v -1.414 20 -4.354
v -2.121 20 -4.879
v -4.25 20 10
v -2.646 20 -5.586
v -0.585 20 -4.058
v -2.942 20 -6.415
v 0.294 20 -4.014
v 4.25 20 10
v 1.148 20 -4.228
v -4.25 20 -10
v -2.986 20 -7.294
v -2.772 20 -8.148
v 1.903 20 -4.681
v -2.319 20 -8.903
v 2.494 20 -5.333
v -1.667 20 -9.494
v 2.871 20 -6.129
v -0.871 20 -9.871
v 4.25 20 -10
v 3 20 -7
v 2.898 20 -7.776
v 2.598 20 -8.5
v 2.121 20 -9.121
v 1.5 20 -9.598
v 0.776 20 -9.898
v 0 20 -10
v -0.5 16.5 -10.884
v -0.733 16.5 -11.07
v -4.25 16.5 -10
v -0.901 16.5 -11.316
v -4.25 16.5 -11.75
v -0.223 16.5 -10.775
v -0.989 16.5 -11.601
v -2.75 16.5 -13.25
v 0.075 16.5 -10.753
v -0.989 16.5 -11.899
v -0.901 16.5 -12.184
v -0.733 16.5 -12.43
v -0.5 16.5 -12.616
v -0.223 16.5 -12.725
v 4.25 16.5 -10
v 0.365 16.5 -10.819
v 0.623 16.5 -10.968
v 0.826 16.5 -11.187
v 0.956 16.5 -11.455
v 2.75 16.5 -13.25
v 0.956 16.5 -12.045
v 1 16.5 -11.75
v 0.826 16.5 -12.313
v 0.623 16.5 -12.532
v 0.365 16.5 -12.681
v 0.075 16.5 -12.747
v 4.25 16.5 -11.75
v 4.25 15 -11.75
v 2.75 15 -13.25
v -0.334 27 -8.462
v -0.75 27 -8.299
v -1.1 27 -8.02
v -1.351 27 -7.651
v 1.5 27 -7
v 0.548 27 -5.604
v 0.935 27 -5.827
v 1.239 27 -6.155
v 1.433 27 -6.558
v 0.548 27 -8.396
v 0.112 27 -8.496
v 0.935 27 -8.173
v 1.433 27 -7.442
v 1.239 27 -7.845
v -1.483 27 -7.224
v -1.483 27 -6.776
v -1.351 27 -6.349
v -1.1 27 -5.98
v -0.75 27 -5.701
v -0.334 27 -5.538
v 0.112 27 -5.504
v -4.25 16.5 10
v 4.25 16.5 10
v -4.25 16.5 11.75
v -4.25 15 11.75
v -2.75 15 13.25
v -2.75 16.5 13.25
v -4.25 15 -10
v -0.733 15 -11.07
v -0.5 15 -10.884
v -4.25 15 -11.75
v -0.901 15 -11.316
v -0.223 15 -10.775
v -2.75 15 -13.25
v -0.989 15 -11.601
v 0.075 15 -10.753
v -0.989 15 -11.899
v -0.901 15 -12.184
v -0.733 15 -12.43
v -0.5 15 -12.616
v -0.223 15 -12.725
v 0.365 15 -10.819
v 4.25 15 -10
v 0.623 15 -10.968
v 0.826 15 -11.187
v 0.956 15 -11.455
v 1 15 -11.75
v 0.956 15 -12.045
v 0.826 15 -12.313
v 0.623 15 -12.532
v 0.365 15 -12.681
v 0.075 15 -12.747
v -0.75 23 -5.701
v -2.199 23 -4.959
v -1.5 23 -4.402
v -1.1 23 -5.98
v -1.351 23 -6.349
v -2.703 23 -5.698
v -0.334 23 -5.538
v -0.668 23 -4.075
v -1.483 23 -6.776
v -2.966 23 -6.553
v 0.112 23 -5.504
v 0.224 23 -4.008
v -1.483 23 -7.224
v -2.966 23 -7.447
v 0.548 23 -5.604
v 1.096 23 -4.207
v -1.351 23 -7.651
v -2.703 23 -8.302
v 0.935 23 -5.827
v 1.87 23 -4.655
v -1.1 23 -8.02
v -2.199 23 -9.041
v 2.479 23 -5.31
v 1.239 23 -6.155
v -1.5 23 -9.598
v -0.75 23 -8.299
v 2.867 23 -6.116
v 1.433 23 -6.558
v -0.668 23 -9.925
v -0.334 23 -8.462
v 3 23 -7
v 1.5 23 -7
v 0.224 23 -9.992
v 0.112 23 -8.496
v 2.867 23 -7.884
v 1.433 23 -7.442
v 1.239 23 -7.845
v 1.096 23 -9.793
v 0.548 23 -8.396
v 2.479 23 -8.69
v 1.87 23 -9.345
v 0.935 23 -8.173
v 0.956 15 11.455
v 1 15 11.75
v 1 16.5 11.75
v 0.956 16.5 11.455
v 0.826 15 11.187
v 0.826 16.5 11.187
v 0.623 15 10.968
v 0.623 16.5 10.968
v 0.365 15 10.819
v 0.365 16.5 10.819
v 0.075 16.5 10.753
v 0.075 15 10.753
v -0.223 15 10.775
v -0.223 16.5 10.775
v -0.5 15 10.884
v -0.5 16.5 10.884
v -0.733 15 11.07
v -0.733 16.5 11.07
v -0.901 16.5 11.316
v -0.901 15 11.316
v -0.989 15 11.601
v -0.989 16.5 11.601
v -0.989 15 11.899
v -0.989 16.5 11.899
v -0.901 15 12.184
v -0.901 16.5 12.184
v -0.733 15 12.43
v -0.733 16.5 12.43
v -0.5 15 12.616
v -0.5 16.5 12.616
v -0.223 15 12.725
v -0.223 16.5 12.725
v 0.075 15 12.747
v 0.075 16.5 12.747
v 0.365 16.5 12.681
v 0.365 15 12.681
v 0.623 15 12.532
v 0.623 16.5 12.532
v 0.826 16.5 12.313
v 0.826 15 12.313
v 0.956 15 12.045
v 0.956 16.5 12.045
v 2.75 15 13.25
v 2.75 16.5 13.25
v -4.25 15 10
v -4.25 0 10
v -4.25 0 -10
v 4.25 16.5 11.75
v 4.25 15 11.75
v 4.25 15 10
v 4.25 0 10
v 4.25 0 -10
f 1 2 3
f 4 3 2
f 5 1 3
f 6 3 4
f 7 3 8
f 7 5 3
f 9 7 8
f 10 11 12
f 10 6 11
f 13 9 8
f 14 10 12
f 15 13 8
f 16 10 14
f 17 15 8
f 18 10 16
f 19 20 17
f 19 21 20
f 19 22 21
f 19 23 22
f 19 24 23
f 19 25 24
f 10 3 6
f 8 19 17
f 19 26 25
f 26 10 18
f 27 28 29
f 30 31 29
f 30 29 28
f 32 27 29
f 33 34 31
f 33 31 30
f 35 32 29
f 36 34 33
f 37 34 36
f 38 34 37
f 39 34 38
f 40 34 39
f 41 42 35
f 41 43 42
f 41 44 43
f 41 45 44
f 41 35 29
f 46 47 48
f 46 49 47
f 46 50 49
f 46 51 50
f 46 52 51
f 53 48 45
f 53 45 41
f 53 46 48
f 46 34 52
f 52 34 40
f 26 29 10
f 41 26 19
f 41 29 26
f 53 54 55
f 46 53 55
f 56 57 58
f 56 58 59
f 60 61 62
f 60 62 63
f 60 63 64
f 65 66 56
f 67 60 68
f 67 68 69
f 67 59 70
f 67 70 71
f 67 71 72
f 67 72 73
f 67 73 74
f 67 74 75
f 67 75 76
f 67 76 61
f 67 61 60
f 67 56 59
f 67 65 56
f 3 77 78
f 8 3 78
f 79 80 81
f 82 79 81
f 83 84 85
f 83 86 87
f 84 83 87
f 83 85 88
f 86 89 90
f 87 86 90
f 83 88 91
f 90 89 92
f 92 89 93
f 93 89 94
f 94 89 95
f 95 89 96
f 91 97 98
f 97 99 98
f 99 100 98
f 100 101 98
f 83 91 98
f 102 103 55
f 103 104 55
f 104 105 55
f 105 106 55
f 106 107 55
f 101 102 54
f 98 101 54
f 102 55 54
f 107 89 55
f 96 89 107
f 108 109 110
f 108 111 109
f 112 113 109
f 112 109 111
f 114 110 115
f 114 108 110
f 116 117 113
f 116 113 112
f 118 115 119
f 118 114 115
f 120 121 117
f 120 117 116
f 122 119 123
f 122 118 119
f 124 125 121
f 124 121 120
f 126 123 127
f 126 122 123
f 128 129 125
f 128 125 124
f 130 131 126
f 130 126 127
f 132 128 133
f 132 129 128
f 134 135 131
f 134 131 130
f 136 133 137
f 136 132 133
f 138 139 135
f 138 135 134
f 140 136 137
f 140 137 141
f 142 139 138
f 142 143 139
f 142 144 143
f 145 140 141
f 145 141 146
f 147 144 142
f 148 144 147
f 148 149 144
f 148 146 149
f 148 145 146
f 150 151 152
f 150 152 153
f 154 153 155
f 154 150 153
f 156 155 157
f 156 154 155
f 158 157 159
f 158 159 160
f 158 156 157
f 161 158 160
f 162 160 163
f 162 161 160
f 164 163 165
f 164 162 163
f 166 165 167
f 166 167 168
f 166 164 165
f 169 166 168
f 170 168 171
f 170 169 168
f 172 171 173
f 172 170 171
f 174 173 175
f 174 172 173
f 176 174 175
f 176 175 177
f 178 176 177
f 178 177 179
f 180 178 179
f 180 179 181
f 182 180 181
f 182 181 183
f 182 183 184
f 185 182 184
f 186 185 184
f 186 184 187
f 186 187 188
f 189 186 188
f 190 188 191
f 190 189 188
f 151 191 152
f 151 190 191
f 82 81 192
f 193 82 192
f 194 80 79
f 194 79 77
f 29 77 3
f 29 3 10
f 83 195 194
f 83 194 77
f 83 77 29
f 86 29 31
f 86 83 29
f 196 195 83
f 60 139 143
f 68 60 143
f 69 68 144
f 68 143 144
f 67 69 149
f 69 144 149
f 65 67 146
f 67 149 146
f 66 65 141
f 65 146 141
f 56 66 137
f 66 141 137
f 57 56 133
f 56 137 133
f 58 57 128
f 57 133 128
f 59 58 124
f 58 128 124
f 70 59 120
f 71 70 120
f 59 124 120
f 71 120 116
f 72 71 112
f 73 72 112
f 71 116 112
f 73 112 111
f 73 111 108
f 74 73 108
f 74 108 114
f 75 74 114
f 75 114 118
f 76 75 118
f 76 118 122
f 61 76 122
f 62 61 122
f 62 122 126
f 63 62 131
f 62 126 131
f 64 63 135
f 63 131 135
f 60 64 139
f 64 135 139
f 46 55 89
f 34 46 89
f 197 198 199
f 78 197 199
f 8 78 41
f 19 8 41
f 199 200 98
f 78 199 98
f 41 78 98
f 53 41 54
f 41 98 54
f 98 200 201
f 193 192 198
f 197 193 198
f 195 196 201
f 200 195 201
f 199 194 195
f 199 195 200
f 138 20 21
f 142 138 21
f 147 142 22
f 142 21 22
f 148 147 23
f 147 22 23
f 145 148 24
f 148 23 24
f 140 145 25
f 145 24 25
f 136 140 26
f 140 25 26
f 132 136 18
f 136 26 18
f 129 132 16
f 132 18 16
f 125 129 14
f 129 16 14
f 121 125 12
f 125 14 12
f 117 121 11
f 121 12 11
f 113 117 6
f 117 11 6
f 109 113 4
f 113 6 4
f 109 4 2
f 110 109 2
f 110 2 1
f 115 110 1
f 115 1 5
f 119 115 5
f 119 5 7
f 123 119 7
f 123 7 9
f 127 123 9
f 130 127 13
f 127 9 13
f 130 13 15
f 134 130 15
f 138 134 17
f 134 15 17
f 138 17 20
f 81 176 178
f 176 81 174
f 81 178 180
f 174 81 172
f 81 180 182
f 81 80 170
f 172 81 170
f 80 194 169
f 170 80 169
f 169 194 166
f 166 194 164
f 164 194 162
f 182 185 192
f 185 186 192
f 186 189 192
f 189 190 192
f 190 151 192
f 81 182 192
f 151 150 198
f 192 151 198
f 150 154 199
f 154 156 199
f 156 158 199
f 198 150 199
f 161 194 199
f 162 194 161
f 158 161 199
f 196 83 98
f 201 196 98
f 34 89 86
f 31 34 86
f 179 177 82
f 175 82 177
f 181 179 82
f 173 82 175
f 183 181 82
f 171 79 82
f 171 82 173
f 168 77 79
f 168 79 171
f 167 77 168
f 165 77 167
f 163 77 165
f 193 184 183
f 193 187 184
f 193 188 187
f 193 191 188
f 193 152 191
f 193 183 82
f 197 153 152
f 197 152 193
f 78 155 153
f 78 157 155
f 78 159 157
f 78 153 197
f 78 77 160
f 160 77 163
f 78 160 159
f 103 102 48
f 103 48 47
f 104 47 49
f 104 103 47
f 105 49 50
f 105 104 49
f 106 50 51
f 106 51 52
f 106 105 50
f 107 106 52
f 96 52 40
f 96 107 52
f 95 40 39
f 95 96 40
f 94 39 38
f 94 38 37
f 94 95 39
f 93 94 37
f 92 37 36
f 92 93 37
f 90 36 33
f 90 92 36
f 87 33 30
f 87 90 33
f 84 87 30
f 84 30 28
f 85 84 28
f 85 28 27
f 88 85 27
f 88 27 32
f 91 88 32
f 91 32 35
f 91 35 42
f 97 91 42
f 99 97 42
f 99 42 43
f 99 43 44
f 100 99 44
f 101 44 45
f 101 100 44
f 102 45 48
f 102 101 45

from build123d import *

# Parameters (mm, degrees)
SKETCH1_W           = 8.5
SKETCH1_H           = 20
BOSS_EXTRUDE1_DEPTH = 20
SKETCH4_R           = 1
BOSS_EXTRUDE2_DEPTH = 1.5
SKETCH6_R           = 3
BOSS_EXTRUDE3_DEPTH = 3
SKETCH7_R           = 1.5
BOSS_EXTRUDE4_DEPTH = 4


with BuildPart() as part:
    # Sketch1 → Boss-Extrude1 (new body)
    with BuildSketch(Plane(origin=(0, 0, 0), x_dir=(1, 0, 0), z_dir=(0, 1, 0))):
        Rectangle(SKETCH1_W, SKETCH1_H)
    extrude(amount=BOSS_EXTRUDE1_DEPTH)

    # Sketch4 → Boss-Extrude2 (add)
    with BuildSketch(Plane(origin=(0, 15, 0), x_dir=(1, 0, 0), z_dir=(0, 1, 0))):
        Polygon((-4.25, 10), (4.25, 10), (4.25, 11.75), (2.75, 13.25), (-2.75, 13.25), (-4.25, 11.75), align=None)
        with Locations((0, 11.75)):
            Circle(SKETCH4_R, mode=Mode.SUBTRACT)
        Polygon((-2.75, -13.25), (2.75, -13.25), (4.25, -11.75), (4.25, -10), (-4.25, -10), (-4.25, -11.75), align=None)
        with Locations((0, -11.75)):
            Circle(SKETCH4_R, mode=Mode.SUBTRACT)
    extrude(amount=BOSS_EXTRUDE2_DEPTH)

    # Sketch6 → Boss-Extrude3 (add)
    with BuildSketch(Plane(origin=(0, 20, 0), x_dir=(1, 0, 0), z_dir=(0, 1, 0))):
        with Locations((0, 7)):
            Circle(SKETCH6_R)
    extrude(amount=BOSS_EXTRUDE3_DEPTH)

    # Sketch7 → Boss-Extrude4 (add)
    with BuildSketch(Plane(origin=(0, 23, 0), x_dir=(1, 0, 0), z_dir=(0, 1, 0))):
        with Locations((0, 7)):
            Circle(SKETCH7_R)
    extrude(amount=BOSS_EXTRUDE4_DEPTH)


solid = part.part
